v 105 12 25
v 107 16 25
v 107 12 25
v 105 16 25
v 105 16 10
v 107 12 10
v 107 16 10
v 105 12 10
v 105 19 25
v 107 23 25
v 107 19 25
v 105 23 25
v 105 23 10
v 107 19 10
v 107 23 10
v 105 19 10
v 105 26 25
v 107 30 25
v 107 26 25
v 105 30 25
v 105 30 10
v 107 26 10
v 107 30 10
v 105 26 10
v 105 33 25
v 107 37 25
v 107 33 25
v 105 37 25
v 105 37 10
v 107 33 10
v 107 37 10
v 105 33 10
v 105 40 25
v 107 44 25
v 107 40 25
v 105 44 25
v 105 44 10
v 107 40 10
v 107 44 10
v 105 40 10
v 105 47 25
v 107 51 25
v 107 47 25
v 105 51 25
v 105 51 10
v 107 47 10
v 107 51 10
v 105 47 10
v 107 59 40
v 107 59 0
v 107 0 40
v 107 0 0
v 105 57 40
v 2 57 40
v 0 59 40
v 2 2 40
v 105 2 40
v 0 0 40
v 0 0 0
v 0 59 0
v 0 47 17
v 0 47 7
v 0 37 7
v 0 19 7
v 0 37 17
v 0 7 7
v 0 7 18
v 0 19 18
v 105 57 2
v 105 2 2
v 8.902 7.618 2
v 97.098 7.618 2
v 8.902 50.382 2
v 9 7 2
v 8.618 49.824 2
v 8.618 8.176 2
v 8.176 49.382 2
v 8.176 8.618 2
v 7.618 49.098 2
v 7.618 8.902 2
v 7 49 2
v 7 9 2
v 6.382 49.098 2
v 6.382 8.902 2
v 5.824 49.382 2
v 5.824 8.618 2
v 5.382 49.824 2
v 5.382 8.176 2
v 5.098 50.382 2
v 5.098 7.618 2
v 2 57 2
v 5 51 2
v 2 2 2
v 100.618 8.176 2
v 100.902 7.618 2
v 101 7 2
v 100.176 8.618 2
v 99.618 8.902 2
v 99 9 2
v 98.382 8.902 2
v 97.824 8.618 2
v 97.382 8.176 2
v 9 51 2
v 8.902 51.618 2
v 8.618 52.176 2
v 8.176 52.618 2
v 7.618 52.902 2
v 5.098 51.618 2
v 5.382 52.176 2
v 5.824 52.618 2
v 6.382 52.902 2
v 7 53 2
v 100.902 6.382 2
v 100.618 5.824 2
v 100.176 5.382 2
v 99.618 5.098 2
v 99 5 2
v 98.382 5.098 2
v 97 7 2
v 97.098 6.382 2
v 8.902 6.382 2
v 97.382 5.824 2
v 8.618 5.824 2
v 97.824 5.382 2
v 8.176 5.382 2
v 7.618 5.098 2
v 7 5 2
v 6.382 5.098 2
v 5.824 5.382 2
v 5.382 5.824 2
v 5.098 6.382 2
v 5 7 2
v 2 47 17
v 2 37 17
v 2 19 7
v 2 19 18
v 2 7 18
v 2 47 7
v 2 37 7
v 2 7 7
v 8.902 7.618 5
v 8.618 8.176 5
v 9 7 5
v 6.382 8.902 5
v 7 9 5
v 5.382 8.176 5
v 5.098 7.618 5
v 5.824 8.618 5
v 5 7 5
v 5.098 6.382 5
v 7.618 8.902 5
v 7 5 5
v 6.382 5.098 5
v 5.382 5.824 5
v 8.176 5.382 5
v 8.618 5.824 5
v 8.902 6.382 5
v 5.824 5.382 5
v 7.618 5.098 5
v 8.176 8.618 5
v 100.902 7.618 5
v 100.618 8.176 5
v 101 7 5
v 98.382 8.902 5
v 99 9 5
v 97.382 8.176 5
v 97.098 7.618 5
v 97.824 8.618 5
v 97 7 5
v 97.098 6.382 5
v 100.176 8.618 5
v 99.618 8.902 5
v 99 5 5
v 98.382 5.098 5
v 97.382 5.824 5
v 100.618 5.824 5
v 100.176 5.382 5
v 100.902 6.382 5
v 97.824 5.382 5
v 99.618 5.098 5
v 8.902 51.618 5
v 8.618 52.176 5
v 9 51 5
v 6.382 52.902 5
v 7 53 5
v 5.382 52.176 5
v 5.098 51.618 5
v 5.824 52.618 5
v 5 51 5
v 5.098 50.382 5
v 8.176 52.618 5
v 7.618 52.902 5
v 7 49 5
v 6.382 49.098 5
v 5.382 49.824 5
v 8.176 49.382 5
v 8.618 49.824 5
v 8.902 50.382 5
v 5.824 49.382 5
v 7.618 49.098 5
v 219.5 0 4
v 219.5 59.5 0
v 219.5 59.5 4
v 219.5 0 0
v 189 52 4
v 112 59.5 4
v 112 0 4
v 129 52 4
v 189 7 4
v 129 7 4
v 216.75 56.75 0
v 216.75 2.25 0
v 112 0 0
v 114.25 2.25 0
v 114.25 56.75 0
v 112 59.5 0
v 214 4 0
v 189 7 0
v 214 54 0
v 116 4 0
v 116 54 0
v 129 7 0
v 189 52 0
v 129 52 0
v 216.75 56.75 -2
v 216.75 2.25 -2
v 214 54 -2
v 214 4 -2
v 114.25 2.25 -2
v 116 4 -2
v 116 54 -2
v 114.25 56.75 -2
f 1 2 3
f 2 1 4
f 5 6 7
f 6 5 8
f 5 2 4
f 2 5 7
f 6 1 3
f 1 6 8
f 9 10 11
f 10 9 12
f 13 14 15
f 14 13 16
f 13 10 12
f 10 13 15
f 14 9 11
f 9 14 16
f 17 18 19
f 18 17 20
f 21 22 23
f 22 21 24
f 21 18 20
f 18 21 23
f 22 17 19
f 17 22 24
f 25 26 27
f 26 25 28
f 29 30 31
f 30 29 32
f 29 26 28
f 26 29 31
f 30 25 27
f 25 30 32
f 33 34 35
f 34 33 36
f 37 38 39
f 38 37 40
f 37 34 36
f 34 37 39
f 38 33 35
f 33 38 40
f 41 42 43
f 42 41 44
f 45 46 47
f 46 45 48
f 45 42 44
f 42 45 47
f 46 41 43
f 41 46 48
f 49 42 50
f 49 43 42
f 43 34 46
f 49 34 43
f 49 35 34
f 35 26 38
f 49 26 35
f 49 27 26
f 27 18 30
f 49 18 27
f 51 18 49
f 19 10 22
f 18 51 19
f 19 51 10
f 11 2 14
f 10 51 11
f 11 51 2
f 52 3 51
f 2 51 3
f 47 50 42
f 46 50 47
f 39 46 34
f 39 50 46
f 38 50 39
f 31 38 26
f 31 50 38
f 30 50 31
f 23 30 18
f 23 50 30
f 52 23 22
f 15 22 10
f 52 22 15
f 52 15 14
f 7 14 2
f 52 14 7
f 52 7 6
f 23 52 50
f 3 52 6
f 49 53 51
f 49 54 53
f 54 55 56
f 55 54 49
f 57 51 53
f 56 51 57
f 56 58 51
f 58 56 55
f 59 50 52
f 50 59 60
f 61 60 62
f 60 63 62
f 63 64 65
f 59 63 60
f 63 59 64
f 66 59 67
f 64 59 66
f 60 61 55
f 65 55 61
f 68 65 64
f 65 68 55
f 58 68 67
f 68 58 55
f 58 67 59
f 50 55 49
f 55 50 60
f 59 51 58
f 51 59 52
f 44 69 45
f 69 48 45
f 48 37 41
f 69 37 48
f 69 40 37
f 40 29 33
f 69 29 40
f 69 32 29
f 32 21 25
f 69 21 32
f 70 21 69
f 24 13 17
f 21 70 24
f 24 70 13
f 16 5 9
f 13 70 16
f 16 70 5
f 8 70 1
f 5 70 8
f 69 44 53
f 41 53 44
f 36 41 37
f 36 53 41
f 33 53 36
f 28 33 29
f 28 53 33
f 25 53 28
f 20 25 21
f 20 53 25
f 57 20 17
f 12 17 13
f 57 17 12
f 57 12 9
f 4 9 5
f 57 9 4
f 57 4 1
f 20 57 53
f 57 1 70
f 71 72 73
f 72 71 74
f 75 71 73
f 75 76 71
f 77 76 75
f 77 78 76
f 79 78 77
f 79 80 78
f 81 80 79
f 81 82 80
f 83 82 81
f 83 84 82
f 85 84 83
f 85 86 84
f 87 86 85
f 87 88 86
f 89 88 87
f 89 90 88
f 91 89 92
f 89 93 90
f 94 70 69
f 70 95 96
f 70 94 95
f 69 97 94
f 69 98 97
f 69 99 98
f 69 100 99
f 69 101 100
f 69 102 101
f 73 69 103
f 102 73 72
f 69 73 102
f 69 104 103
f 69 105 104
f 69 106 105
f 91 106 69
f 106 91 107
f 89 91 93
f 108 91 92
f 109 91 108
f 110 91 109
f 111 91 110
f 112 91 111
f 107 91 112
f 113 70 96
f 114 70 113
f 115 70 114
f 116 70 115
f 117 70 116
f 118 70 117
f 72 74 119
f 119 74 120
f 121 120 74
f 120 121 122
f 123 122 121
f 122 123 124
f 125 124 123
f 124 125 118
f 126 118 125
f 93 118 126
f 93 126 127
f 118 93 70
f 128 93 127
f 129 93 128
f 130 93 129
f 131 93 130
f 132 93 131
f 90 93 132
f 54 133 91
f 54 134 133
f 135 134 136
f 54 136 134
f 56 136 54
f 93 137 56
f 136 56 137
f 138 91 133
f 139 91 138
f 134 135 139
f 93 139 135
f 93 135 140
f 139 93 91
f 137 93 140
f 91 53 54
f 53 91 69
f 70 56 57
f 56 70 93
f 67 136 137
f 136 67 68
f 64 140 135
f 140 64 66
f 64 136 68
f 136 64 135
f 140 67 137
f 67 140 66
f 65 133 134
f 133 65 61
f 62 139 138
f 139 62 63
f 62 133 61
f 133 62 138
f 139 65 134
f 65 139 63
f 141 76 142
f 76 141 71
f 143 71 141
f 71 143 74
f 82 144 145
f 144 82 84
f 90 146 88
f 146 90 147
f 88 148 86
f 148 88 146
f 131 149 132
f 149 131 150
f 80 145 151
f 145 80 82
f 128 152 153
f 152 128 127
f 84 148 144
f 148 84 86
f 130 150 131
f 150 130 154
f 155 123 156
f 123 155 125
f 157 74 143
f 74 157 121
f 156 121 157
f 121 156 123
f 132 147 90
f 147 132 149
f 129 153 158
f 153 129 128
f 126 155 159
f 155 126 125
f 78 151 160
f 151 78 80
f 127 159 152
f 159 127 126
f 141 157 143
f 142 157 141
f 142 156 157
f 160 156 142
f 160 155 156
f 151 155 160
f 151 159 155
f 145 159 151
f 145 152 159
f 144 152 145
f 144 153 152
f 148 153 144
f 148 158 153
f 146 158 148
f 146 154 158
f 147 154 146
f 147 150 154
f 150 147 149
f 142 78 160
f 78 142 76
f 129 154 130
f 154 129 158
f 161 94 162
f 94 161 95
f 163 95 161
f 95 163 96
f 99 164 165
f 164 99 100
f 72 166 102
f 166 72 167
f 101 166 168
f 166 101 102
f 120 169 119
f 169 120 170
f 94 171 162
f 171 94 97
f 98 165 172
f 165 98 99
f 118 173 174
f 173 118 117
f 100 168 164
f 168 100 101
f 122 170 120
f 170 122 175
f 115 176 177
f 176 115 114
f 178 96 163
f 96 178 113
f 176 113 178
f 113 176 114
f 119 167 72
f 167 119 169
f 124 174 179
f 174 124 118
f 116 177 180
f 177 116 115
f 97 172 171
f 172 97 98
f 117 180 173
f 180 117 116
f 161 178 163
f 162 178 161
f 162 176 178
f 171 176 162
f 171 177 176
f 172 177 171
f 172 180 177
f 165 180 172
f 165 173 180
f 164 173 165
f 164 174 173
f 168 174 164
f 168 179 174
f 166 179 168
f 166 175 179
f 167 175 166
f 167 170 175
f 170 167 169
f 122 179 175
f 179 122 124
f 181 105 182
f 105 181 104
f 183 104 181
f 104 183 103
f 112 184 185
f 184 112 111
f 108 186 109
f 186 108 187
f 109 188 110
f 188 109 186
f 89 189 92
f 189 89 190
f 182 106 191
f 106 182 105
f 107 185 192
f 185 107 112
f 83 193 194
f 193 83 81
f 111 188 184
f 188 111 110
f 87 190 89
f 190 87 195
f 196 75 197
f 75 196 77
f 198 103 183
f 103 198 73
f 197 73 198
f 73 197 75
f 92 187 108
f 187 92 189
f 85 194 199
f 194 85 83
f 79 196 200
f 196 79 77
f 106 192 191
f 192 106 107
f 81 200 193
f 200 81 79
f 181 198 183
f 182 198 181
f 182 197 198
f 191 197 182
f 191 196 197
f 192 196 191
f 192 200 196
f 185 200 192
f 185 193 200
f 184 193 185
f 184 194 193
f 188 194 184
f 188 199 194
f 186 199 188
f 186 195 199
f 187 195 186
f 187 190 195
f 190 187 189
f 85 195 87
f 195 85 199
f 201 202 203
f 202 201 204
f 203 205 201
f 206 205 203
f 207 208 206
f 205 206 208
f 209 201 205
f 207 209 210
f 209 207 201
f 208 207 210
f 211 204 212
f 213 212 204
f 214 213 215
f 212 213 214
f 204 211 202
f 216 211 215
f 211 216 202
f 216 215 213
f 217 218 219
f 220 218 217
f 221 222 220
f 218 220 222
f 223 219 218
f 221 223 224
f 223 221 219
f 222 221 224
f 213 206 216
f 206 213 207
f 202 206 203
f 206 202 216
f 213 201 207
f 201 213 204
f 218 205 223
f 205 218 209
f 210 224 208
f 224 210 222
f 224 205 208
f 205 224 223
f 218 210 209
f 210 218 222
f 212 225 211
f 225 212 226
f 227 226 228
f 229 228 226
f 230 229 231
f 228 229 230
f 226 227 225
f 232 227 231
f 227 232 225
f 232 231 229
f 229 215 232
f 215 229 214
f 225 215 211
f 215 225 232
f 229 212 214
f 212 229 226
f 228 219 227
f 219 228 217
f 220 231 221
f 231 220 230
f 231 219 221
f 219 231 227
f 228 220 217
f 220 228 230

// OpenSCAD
/*
  CAJA PARA RELOJ ARDUINO MEGA + TFT
  Diseño paramétrico para Impresión 3D
*/

// --- PARAMETROS ---
ancho_mega = 54;
largo_mega = 102;
alto_caja = 40;
pared = 2;
tolerancia = 0.5;

// --- DIBUJO ---
part = "all"; // [all, base, lid]

if (part == "all" || part == "base") {
    translate([0, 0, 0]) caja_base();
}

if (part == "all" || part == "lid") {
    translate([part=="all" ? largo_mega + 10 : 0, 0, 0]) tapa();
}

module caja_base() {
    difference() {
        // Cuerpo exterior
        cube([largo_mega + pared*2 + tolerancia*2, ancho_mega + pared*2 + tolerancia*2, alto_caja]);
        
        // Vaciado interior
        translate([pared, pared, pared])
            cube([largo_mega + tolerancia*2, ancho_mega + tolerancia*2, alto_caja]);
            
        // Hueco USB y Alimentacion (Ajustar segun necesites)
        translate([-1, pared + 5, pared + 5])
            cube([pared + 2, 12, 11]); // USB
        
        translate([-1, pared + 35, pared + 5])
            cube([pared + 2, 10, 10]); // Jack Alimentacion
            
        // Ranuras de ventilacion (para sensores)
        for (i = [0 : 5]) {
            translate([largo_mega + pared, pared + 10 + i*7, 10])
                cube([pared + 2, 4, 15]);
        }
    }
    
    // Soportes Arduino (Esquinas)
    translate([pared + 5, pared + 5, pared]) cylinder(h=3, r=2, $fn=20);
    translate([largo_mega + pared - 5, pared + 5, pared]) cylinder(h=3, r=2, $fn=20);
    translate([pared + 5, ancho_mega + pared - 5, pared]) cylinder(h=3, r=2, $fn=20);
}

module tapa() {
    difference() {
        // Tapa exterior
        cube([largo_mega + pared*2 + tolerancia*3, ancho_mega + pared*2 + tolerancia*3, pared*2]);
        
        // Ventana para Pantalla TFT
        // Ajustar coordenadas segun la posicion de tu pantalla
        translate([pared + 15, pared + 5, -1])
            cube([60, 45, pared*3]); 
    }
    
    // Reborde para encajar
    difference() {
        translate([pared + tolerancia/2, pared + tolerancia/2, -pared])
            cube([largo_mega + tolerancia, ancho_mega + tolerancia, pared]);
        translate([pared*2, pared*2, -pared-1])
            cube([largo_mega - pared*2, ancho_mega - pared*2, pared+2]);
    }
}
